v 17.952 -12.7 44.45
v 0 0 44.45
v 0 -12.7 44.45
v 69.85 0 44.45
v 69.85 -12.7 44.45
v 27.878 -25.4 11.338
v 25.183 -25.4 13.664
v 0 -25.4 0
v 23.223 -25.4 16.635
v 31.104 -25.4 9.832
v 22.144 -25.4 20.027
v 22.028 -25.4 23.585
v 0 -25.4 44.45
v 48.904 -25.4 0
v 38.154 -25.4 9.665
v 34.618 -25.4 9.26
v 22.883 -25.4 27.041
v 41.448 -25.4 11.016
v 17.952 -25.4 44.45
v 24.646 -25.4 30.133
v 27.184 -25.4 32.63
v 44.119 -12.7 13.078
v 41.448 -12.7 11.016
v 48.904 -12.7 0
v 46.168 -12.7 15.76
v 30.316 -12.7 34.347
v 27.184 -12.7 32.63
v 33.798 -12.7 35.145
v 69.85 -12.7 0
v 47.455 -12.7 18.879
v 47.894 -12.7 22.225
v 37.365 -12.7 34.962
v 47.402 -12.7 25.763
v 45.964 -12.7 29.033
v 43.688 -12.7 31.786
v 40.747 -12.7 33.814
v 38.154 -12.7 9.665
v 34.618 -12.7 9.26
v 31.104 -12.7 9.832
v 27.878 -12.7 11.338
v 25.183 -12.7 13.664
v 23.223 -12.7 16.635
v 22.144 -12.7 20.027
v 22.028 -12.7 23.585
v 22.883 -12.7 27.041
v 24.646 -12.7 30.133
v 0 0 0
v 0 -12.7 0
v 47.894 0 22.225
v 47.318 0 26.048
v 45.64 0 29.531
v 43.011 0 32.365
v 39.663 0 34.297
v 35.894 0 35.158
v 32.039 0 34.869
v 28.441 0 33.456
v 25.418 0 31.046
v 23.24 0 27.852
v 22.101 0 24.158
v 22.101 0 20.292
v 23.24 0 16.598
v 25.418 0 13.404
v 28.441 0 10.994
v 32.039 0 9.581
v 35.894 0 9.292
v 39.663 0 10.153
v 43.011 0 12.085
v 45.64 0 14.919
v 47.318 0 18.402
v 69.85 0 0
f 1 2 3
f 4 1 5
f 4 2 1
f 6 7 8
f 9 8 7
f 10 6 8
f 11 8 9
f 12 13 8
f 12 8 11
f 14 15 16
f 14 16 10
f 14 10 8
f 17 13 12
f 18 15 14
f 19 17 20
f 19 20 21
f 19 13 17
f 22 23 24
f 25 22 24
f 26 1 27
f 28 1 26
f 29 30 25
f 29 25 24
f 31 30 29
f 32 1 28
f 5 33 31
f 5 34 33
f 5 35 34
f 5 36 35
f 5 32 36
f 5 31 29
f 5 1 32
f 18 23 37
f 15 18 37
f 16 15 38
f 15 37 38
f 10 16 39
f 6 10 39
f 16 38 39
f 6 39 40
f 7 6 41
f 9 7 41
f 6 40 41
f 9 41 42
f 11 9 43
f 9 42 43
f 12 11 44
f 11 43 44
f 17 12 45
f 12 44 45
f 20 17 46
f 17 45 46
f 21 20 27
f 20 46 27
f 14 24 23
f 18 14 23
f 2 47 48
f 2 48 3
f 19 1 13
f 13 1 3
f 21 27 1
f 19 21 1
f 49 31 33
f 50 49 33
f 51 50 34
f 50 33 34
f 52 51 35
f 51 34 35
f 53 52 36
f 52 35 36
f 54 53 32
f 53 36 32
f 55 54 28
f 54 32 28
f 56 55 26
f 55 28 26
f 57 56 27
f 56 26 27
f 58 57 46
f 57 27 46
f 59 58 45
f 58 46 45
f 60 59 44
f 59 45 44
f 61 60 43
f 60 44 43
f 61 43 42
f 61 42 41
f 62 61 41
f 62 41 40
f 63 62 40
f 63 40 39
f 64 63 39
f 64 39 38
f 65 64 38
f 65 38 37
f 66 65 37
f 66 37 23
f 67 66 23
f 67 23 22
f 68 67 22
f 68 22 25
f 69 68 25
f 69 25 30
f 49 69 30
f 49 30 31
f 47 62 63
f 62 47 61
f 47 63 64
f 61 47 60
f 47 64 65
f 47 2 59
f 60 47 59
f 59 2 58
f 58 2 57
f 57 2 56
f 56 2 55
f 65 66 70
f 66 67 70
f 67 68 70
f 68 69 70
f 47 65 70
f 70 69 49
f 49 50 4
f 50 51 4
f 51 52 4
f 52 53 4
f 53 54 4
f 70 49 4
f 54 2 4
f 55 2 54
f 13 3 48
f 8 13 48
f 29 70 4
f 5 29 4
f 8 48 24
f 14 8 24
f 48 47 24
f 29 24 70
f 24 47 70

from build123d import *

# Parameters (mm, degrees)
F0_W     = 69.85
F0_H     = 44.45
F1_DEPTH = 12.7
F2_R     = 12.9689795612
F3_DEPTH = 25.4
F5_DEPTH = 12.7


with BuildPart() as f1:
    # F0 (on Front) → F1 (new body)
    with BuildSketch(Plane.XZ):
        with Locations((34.925, 22.225)):
            Rectangle(F0_W, F0_H)
    extrude(amount=F1_DEPTH)

    # F2 (on face) → F3 (cut)
    with BuildSketch(Plane.XZ.offset(12.7)):
        with Locations((34.925, 22.225)):
            Circle(F2_R)
    extrude(amount=-F3_DEPTH, mode=Mode.SUBTRACT)

    # F4 (on face) → F5 (join)
    with BuildSketch(Plane.XZ.offset(12.7)):
        with BuildLine():
            Line((27.1838563224, 32.6302450918), (17.9519541562, 44.45))
            Line((17.9519541562, 44.45), (0, 44.45))
            Line((0, 44.45), (0, 0))
            Line((0, 0), (48.9035993814, 0))
            Line((48.9035993814, 0), (41.4478117951, 11.0157468071))
            ThreePointArc((41.4478117951, 11.0157468071), (24.1005962211, 15.081701484), (27.1838563224, 32.6302450918))
        make_face()
    extrude(amount=F5_DEPTH)


solid = f1.part
